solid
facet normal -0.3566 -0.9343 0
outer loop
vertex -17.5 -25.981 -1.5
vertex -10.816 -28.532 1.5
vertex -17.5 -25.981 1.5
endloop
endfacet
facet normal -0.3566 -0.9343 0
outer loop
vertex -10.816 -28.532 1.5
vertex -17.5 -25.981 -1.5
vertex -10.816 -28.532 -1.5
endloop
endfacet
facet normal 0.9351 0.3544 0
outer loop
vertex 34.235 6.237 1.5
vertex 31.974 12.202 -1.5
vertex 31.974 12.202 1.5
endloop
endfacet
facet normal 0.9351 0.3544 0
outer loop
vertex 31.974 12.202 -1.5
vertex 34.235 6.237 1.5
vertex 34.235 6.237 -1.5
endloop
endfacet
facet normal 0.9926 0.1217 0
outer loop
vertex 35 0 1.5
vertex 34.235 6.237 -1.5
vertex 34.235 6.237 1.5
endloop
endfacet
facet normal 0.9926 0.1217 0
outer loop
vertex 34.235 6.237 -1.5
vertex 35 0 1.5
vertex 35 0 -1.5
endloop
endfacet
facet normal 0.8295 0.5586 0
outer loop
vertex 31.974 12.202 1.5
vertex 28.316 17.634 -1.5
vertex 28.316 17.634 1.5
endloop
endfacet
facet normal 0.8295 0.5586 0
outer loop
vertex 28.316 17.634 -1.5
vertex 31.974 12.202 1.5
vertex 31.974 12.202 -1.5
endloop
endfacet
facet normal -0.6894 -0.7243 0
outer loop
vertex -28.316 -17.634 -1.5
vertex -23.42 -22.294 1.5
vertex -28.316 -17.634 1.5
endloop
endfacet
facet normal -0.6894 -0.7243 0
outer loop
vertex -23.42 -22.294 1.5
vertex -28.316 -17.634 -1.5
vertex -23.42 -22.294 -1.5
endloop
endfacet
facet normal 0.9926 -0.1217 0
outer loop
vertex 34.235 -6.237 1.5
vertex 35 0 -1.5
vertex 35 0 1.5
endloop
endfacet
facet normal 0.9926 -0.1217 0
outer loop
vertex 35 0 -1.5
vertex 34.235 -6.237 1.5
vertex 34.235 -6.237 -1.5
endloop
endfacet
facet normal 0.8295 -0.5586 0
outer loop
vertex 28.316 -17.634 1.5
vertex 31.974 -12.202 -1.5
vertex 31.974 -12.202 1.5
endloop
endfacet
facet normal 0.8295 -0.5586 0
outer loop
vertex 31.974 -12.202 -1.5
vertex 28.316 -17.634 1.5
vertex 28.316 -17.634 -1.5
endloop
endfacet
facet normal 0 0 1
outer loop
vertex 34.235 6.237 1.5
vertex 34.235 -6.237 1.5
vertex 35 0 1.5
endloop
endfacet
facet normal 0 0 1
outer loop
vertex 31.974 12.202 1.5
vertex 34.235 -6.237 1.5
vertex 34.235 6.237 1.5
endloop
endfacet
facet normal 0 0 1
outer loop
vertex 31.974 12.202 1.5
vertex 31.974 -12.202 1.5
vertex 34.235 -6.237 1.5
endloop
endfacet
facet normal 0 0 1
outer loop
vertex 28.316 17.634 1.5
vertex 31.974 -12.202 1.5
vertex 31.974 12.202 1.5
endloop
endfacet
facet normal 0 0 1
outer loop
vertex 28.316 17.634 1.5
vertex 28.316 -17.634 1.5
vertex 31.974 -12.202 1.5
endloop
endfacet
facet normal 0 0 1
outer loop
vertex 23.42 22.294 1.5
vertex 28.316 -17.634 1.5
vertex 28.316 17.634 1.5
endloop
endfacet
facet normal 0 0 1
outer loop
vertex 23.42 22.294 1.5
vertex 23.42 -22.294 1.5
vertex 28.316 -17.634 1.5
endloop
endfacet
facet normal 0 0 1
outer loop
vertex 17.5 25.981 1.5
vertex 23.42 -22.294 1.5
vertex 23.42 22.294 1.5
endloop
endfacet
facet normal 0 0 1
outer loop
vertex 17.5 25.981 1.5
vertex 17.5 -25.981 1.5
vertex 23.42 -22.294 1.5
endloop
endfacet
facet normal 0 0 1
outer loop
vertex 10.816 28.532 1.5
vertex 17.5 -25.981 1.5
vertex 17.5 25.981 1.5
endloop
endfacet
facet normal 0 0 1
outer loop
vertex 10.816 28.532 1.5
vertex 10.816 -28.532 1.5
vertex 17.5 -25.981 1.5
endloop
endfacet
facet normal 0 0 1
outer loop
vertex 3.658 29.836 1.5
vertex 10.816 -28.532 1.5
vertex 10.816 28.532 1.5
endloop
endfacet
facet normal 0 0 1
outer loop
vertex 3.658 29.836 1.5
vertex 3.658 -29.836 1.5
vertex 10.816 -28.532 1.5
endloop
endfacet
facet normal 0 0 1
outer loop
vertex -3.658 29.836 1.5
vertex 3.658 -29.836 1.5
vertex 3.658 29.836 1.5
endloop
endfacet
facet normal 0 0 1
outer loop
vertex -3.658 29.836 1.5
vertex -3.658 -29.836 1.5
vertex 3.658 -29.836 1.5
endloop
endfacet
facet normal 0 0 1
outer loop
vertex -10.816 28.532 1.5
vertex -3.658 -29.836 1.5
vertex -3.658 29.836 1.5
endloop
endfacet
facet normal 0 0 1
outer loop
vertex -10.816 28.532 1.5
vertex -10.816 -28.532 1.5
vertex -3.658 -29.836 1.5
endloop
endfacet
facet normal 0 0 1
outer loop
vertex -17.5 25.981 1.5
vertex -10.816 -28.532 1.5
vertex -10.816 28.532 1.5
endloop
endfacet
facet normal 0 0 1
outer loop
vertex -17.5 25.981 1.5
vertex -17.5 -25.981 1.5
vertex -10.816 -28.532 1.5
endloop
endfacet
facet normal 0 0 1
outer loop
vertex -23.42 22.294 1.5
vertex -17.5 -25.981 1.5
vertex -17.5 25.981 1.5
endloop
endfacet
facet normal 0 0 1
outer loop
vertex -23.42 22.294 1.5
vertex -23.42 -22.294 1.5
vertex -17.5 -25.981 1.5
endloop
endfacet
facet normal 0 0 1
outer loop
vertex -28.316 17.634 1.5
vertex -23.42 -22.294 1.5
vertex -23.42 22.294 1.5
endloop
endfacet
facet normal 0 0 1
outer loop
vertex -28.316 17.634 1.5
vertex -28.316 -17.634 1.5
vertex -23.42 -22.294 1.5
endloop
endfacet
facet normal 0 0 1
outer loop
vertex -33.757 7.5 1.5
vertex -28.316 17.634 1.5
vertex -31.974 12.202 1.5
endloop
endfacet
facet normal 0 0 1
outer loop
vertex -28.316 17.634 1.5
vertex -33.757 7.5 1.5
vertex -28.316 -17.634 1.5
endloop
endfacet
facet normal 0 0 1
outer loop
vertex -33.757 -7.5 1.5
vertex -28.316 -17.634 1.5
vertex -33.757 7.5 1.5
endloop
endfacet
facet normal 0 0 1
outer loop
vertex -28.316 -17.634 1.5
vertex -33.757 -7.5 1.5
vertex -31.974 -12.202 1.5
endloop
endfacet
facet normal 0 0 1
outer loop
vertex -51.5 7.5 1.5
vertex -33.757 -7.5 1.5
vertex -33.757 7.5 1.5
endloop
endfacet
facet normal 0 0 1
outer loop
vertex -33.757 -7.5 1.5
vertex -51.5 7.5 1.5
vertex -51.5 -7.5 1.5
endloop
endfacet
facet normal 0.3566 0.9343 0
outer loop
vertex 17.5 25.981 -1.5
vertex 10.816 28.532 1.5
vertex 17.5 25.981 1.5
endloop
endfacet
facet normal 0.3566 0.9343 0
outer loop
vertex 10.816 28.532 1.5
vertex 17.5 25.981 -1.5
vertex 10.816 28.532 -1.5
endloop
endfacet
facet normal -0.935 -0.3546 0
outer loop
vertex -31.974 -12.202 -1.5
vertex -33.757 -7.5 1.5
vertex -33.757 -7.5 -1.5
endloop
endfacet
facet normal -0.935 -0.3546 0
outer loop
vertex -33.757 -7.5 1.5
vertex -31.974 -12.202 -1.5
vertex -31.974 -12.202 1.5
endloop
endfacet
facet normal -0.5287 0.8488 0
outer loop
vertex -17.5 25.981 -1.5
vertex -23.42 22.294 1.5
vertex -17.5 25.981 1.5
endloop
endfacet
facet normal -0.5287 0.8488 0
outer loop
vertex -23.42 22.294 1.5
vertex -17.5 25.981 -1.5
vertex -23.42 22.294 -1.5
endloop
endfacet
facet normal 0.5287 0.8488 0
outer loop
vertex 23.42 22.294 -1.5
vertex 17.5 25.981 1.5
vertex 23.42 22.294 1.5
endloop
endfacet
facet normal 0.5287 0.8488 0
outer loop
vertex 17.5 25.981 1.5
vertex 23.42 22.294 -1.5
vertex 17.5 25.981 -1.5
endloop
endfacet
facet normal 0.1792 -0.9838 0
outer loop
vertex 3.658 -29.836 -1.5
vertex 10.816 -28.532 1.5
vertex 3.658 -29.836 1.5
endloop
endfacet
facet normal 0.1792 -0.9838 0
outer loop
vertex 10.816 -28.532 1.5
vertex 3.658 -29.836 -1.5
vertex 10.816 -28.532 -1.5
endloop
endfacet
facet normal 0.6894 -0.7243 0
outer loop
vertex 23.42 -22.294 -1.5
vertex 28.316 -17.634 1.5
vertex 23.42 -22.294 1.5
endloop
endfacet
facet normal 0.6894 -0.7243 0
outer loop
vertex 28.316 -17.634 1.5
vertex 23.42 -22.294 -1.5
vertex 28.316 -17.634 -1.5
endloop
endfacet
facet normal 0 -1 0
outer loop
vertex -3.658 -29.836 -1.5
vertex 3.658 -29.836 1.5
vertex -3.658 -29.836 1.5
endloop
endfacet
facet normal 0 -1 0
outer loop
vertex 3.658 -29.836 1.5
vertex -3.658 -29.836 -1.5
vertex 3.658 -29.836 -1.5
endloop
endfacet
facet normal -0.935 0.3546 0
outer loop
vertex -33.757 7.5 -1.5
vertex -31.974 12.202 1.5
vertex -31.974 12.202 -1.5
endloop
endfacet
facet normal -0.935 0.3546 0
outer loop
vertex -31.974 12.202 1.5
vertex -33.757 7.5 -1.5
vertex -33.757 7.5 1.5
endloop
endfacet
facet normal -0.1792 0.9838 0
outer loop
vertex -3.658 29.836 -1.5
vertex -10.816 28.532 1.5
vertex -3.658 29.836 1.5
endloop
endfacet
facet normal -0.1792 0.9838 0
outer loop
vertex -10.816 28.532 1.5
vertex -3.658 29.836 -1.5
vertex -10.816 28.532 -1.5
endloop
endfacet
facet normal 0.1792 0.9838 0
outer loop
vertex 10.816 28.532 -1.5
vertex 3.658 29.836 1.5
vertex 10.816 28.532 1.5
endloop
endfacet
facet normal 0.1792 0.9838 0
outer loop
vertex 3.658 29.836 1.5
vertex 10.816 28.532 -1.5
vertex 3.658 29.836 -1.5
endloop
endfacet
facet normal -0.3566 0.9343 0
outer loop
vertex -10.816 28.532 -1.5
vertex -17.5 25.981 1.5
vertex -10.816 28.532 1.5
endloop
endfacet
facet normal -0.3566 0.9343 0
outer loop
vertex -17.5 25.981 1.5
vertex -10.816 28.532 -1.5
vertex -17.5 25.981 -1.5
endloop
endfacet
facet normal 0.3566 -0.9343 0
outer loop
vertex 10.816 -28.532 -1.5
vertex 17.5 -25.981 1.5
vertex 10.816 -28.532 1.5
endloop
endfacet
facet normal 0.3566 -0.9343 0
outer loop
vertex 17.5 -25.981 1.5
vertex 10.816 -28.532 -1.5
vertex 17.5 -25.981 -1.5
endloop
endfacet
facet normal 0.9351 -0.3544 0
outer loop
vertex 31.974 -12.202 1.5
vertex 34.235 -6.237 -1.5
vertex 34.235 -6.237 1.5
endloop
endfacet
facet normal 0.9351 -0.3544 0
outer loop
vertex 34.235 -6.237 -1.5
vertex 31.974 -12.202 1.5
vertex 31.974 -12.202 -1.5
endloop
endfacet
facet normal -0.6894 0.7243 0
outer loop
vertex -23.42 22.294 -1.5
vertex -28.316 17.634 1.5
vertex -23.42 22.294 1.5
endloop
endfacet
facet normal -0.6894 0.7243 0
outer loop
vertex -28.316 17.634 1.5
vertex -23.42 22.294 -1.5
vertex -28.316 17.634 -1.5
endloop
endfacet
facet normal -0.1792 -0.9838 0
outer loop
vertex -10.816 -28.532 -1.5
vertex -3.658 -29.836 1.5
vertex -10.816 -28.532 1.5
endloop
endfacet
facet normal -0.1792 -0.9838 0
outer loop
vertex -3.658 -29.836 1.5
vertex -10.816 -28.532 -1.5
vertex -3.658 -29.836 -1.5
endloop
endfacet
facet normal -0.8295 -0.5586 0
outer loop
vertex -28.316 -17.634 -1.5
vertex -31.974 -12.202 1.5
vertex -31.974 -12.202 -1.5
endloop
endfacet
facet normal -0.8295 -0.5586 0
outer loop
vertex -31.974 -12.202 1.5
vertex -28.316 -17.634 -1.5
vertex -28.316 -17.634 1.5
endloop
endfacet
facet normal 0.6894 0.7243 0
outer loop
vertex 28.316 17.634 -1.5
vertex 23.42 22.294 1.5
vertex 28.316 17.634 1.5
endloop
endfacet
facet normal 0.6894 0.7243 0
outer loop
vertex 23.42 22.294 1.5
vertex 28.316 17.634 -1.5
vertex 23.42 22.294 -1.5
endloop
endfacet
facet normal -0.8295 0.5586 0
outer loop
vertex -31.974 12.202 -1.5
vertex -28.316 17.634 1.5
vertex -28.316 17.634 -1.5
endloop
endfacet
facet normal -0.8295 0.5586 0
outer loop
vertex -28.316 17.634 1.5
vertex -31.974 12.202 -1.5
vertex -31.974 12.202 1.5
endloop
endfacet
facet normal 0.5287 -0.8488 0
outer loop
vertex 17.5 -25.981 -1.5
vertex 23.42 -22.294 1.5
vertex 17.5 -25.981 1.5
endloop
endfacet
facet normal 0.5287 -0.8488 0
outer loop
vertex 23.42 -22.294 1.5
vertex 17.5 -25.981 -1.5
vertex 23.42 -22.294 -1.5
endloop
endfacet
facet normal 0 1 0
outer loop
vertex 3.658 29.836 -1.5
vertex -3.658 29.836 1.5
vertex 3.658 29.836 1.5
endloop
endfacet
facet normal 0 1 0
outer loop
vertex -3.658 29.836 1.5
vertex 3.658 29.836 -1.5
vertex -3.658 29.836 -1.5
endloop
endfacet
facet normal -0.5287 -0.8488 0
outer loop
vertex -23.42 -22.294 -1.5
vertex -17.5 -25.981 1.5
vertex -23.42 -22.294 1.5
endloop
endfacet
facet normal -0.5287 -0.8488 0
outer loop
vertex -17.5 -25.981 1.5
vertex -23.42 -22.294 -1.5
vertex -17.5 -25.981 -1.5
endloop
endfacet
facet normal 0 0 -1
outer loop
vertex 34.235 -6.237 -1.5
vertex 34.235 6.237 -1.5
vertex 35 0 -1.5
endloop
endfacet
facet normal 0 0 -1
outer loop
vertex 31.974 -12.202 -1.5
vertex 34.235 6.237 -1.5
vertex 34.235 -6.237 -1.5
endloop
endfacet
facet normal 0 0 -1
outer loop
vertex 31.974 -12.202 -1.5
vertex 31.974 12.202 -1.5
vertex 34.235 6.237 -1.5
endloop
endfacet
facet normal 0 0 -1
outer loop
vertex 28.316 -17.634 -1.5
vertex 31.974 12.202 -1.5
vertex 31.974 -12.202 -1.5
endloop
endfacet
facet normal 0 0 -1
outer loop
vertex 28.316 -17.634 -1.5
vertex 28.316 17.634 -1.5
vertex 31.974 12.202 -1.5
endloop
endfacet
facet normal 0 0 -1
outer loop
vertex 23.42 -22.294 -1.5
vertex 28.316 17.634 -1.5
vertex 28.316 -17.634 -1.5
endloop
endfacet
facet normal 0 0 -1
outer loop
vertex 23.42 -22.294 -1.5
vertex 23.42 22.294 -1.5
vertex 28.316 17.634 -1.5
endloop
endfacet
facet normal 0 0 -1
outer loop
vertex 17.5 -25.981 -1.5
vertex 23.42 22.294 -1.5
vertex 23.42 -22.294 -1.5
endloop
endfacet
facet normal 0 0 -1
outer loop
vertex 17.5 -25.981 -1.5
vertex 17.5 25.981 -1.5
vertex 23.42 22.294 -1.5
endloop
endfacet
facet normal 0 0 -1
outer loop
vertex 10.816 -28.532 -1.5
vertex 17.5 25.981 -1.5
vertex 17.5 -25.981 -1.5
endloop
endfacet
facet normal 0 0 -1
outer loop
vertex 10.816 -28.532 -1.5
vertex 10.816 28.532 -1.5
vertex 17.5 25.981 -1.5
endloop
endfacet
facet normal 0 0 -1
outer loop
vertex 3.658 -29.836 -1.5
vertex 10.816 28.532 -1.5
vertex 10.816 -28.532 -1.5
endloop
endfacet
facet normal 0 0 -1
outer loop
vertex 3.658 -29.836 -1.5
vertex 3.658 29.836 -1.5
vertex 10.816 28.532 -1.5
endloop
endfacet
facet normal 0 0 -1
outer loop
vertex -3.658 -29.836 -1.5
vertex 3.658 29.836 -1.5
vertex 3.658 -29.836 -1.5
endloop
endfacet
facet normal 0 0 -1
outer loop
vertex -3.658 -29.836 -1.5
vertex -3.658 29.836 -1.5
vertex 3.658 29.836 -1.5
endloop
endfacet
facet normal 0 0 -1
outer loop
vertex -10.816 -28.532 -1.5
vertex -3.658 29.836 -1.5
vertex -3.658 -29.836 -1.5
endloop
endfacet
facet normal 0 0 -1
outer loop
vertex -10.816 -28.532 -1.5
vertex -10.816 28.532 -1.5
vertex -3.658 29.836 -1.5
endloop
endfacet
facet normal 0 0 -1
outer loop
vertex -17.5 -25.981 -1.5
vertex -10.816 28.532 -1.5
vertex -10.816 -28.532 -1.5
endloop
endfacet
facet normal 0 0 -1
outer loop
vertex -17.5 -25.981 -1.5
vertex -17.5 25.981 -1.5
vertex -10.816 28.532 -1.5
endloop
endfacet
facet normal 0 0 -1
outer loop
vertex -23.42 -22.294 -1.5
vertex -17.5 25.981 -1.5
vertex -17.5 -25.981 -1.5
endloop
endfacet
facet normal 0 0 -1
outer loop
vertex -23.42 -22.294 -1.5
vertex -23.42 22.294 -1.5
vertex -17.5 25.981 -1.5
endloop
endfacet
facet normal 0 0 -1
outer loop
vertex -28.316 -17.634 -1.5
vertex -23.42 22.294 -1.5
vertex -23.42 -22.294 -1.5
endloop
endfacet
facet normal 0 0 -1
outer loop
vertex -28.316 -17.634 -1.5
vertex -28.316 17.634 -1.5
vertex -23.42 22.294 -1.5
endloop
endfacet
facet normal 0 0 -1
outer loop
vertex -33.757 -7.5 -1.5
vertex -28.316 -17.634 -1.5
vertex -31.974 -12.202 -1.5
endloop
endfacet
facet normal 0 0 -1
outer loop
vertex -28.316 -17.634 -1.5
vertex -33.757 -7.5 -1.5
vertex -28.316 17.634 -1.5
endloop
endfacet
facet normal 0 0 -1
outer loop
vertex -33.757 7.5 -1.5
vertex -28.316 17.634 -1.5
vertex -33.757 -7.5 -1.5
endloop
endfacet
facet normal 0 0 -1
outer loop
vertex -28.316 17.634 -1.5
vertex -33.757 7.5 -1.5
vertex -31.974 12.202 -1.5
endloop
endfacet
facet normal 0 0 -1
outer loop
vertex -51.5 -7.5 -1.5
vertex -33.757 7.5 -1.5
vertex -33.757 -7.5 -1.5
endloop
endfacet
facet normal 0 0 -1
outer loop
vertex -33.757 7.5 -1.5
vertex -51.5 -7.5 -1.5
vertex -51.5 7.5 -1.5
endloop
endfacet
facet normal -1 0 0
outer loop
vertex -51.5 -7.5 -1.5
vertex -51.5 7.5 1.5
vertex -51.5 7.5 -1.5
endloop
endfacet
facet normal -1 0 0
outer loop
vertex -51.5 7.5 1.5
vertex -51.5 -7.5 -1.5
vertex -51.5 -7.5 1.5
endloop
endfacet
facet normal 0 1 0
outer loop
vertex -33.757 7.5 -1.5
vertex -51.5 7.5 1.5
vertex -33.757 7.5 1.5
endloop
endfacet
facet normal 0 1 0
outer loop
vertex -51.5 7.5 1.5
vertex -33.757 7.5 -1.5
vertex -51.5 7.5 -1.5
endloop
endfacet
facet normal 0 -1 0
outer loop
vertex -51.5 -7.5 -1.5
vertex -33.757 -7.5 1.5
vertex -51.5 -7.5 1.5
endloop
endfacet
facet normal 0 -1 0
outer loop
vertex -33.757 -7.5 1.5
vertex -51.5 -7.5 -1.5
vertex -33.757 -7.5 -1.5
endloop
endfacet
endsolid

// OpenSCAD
use <Writescad/write.scad>

stencil_thickness = 3;

// Sort of try to make it an elipse / oval

stencil_outer_radius1 = 30;
stencil_outer_radius2 = 35;
// stencil_outer_radius1 = 25;
//stencil_outer_radius2 = 25;

// This is the inner ones - basically the head of the poles handle.
// Used during development.
stencil_inner_radius1 = 18;
stencil_inner_radius2 = 24;

// text height determines the size that will fit on the head of the pole handle.
text_height = 16;

rsh_text_height = text_height / 4;

// Handle is a simple cube.
//handle_length = 100;
handle_length = 20;

handle_width = 15;

// Include handle
inner_only = false;

// Calculated stuff.

text_thickness = stencil_thickness * 2 ;


// Center corrected write helper funtion
module write_cc(text, height) {
    // Translate to middle of text height. 6 is emperical on the stencil font.
    // Translate X to middle of string - Empircal
    // two letters (i < 100), factor i 0.22
    // Lucky, even works with other lenghts! :-)
    translate([-(height*0.22),-height/6,0])
    write(text, t = text_thickness, thickness, h = height, space = 1.2, center= true);
}

// An oval, centered, with the number in. Includes outer stencil (cover) and handle if global variable set.

module stencil(number) {
    difference() {
        if (inner_only) {
            scale([1, stencil_inner_radius1/stencil_inner_radius2, 1]) cylinder(h=stencil_thickness, r=stencil_inner_radius2, center = true);
        } else {
            scale([1, stencil_outer_radius1/stencil_outer_radius2, 1]) cylinder(h=stencil_thickness, r=stencil_outer_radius2, center = true);
        }
        // Substract the stencil font
        write_cc(str(number), text_height);
        
        // This will not work, unfortunately
        /*
        translate([0,-stencil_inner_radius1*0.8,0])
        write_cc("RSH", rsh_text_height);
        translate([0,stencil_inner_radius1*0.8,0])
        write_cc("RSH", rsh_text_height); */
    }

    // Include handle if set for that.
    if (!inner_only) {
        // Handle. 0.9 will not work with all values.
        translate([-handle_length/2-stencil_outer_radius2*0.9,0,0])
        cube([handle_length, handle_width, stencil_thickness], center = true);
    }
}

///////////////////////////////////////
i_start = 70;
i_end = 135;
i_step = 5;

module main() {
    for (i = [i_start:i_step:i_end] ) {
        my_step = (i-i_start)/i_step;
        translate([0, my_step * (stencil_inner_radius2 + 5), 0]) stencil(i);
    }
}


// main();
stencil(125);
